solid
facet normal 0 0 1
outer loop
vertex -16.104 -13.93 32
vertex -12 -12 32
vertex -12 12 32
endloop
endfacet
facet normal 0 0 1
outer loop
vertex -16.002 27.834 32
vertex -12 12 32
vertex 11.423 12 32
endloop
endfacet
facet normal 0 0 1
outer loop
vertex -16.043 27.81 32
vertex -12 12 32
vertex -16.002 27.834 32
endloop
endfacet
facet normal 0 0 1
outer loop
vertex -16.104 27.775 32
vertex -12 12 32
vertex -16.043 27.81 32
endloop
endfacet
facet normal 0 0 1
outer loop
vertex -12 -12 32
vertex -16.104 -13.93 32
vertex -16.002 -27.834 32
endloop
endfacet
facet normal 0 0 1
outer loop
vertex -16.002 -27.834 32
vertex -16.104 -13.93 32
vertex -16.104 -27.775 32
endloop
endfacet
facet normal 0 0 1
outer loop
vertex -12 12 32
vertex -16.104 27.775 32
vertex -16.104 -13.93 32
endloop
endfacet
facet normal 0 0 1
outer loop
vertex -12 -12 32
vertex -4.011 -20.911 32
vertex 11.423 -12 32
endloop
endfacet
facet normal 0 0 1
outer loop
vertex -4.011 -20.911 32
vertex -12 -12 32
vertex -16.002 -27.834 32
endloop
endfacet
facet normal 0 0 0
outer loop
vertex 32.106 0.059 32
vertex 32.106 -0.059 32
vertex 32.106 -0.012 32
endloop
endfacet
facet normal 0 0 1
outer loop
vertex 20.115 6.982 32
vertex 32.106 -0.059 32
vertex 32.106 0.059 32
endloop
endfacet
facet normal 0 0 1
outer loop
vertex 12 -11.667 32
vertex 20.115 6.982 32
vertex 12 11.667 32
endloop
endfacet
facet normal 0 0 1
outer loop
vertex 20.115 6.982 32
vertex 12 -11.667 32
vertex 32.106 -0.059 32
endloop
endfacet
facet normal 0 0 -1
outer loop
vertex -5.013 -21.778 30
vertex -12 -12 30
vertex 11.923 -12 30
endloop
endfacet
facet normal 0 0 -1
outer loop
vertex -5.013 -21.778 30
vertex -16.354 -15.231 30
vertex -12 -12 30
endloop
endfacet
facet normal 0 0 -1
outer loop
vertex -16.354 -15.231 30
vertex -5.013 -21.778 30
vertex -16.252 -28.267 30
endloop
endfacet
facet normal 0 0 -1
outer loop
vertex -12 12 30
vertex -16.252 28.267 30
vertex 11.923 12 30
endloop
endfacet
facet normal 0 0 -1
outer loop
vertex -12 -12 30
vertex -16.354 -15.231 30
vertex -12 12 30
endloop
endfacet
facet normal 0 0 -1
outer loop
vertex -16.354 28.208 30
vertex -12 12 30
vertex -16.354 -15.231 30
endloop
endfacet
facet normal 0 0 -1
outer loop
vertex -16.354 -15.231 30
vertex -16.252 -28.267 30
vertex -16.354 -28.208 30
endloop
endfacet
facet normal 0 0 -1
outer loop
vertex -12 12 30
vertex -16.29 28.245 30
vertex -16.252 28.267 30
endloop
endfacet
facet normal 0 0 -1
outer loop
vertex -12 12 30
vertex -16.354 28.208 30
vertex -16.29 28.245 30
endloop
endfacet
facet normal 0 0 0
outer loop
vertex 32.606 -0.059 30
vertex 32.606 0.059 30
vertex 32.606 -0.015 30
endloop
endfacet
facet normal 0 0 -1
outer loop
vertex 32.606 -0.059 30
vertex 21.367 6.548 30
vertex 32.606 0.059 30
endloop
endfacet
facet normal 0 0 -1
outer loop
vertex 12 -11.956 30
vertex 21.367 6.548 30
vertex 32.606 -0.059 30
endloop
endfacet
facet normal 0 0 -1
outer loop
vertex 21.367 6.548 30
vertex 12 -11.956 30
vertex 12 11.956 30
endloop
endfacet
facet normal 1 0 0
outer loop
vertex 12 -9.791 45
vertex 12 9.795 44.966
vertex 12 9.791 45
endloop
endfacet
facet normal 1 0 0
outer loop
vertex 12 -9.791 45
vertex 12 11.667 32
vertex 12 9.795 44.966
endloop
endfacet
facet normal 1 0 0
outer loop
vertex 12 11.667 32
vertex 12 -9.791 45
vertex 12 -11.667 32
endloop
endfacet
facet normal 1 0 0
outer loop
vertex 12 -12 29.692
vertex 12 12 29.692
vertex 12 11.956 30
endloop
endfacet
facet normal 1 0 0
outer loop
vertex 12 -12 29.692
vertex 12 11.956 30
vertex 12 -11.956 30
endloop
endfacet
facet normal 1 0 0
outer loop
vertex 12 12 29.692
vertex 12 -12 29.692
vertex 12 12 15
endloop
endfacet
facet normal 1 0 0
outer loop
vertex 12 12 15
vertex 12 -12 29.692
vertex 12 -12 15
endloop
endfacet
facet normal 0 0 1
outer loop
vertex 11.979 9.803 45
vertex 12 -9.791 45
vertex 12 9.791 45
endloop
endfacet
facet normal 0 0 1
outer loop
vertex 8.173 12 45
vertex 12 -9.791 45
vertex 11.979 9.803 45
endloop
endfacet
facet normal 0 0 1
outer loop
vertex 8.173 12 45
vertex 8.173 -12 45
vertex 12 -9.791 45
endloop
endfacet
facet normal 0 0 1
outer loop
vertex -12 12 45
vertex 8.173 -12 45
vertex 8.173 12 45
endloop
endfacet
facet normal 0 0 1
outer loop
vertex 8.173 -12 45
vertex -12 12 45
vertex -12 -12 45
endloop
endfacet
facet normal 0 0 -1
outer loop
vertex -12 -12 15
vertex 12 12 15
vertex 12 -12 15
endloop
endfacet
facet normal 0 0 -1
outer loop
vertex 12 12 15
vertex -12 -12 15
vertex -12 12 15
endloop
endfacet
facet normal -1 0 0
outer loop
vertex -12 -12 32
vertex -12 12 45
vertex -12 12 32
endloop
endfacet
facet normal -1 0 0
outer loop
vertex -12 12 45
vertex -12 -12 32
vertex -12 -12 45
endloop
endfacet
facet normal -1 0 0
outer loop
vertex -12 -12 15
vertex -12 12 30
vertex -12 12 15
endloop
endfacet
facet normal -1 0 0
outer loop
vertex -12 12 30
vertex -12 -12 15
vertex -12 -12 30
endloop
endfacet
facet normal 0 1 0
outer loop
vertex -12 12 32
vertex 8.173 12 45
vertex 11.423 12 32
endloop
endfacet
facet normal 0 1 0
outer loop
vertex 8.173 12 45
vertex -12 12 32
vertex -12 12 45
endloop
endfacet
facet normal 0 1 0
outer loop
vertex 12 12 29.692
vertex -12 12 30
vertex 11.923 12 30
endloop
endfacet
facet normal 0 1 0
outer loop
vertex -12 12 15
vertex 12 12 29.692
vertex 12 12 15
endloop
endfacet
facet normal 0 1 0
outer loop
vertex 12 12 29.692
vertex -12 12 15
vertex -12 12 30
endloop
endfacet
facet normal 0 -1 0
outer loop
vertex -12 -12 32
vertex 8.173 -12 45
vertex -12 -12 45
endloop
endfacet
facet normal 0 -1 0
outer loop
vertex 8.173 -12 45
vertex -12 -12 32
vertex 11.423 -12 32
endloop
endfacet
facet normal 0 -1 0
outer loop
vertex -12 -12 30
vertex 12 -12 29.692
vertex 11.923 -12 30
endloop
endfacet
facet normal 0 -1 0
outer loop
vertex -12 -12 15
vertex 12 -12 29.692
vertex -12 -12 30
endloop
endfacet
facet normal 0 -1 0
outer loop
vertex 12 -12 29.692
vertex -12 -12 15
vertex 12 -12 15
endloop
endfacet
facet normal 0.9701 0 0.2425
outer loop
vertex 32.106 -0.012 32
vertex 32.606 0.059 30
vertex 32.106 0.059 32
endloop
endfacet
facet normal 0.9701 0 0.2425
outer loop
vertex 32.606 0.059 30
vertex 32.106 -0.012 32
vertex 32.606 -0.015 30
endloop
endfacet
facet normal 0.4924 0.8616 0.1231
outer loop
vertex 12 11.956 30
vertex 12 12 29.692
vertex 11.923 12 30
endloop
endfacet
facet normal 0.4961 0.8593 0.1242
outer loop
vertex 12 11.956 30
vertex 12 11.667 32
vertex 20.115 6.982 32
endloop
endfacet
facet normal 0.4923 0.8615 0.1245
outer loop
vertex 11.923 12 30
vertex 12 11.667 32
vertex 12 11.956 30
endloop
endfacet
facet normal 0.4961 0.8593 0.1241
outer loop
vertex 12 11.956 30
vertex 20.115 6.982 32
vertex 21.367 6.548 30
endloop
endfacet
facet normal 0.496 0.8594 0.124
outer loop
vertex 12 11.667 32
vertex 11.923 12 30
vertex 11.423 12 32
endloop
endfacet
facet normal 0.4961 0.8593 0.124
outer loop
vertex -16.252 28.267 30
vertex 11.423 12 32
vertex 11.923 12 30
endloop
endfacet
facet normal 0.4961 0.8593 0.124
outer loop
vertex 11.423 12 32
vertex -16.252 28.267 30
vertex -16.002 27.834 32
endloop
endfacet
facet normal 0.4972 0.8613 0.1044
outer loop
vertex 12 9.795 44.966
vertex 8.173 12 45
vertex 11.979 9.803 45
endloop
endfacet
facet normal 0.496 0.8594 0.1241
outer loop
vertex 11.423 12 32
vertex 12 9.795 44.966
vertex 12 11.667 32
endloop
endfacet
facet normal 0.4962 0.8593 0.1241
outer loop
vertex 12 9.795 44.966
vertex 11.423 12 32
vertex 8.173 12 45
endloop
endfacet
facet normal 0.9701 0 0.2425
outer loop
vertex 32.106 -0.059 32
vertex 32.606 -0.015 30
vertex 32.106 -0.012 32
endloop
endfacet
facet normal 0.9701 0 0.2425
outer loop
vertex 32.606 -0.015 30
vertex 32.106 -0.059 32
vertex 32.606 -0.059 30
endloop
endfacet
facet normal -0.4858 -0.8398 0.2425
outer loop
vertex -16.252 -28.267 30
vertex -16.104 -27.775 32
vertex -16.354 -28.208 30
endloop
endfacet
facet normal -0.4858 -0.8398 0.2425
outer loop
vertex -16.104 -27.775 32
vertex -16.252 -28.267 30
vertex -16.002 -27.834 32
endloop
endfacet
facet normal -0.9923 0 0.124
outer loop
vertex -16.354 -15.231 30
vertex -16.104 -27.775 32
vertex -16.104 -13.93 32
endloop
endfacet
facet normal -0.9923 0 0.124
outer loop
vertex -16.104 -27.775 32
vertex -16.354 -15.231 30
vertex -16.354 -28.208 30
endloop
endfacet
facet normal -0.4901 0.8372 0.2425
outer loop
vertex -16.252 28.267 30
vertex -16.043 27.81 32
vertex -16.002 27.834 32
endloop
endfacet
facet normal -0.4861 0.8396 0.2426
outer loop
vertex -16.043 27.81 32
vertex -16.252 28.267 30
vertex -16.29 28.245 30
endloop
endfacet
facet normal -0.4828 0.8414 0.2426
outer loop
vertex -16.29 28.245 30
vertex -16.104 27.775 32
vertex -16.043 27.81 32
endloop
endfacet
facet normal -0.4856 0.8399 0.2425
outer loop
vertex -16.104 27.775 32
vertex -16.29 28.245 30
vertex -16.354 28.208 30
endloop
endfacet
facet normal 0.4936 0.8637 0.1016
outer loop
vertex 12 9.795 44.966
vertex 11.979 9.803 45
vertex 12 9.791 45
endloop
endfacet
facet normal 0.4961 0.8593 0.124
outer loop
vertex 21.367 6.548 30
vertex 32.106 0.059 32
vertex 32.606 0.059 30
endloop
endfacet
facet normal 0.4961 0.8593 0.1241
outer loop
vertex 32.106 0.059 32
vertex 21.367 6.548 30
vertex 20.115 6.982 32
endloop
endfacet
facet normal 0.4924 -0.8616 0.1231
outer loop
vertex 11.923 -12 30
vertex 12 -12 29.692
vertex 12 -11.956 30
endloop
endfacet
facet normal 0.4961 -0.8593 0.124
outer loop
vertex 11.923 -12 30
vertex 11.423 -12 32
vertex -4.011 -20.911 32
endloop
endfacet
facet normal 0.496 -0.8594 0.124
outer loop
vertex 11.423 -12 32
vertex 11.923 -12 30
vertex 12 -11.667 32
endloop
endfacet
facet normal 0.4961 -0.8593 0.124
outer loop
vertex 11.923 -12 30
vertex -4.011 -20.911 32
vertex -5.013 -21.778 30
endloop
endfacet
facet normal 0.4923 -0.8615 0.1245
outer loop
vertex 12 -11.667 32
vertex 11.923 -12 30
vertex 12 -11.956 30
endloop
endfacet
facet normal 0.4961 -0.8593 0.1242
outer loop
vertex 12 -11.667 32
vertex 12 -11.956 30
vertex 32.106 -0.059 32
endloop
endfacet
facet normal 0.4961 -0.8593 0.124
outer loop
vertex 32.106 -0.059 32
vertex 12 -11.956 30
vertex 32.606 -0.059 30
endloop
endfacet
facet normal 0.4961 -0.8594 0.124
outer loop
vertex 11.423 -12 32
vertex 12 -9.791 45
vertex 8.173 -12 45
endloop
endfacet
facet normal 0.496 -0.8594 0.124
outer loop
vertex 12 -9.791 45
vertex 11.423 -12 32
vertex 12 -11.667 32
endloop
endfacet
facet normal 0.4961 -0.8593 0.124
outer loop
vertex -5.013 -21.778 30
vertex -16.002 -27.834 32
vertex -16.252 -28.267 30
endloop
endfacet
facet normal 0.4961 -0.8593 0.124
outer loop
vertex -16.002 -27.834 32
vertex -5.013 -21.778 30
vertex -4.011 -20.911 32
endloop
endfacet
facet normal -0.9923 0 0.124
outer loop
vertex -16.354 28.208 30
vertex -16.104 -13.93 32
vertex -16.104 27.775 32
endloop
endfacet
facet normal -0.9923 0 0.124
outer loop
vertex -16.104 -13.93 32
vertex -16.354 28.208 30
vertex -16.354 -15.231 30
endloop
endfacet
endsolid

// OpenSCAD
wall=2;
overlap=0.01;
module switchhole(){
    
    plateThickness=wall+overlap*2;
    lkey=19.05;
    holesize=14;
    width=15;
    height=5;
    mountingholeradius=2;
    cutoutheight = 3;
    cutoutwidth = 1;
    holediff=lkey-holesize;
    w=width*lkey;
    h=height*lkey;

	translate([-holesize/2,-holesize/2,-overlap]) union(){
		cube([holesize,holesize,plateThickness]);

		translate([-cutoutwidth,1,0])
		cube([holesize+2*cutoutwidth,cutoutheight,plateThickness]);

		translate([-cutoutwidth,holesize-cutoutwidth-cutoutheight,0])
		cube([holesize+2*cutoutwidth,cutoutheight,plateThickness]);
	}
}

module baseshape(size) {
    rotate([0,0,60]) hull() {
        for (a=[0:2]) {
            rotate([0,0,a*(360/3)]) translate([-size,0]) circle(0.1);
        }
    }
}

module shell() {
    difference() {
        
        hull () {
            linear_extrude(.1) baseshape(40);
            translate([0,0,80])
            linear_extrude(.1) baseshape(20);
        }
            
        hull () {
            linear_extrude(.1) baseshape(40-wall);
            translate([0,0,80+0.1])
            linear_extrude(.1) baseshape(20-wall);
        }
    }
}
module topCube(cubesize) {
    
    
    translate([0,0,68]) 
    rotate([0,-35,0])
    rotate([45,0,0])
    cube([cubesize,cubesize,cubesize]);
}

module switchplate() {
    intersection() {
        translate([0,0,30]) union() {
            difference() {
                translate([0,0,wall/2]) cube([80,80,wall], center=true);
                switchhole();
            }
            cube([24,24,30], center=true);
        }
        hull () {
            linear_extrude(.1) baseshape(40);
            translate([0,0,80])
            linear_extrude(.1) baseshape(20);
        }
    }
}

//shell();
//topCube(50);
switchplate();
